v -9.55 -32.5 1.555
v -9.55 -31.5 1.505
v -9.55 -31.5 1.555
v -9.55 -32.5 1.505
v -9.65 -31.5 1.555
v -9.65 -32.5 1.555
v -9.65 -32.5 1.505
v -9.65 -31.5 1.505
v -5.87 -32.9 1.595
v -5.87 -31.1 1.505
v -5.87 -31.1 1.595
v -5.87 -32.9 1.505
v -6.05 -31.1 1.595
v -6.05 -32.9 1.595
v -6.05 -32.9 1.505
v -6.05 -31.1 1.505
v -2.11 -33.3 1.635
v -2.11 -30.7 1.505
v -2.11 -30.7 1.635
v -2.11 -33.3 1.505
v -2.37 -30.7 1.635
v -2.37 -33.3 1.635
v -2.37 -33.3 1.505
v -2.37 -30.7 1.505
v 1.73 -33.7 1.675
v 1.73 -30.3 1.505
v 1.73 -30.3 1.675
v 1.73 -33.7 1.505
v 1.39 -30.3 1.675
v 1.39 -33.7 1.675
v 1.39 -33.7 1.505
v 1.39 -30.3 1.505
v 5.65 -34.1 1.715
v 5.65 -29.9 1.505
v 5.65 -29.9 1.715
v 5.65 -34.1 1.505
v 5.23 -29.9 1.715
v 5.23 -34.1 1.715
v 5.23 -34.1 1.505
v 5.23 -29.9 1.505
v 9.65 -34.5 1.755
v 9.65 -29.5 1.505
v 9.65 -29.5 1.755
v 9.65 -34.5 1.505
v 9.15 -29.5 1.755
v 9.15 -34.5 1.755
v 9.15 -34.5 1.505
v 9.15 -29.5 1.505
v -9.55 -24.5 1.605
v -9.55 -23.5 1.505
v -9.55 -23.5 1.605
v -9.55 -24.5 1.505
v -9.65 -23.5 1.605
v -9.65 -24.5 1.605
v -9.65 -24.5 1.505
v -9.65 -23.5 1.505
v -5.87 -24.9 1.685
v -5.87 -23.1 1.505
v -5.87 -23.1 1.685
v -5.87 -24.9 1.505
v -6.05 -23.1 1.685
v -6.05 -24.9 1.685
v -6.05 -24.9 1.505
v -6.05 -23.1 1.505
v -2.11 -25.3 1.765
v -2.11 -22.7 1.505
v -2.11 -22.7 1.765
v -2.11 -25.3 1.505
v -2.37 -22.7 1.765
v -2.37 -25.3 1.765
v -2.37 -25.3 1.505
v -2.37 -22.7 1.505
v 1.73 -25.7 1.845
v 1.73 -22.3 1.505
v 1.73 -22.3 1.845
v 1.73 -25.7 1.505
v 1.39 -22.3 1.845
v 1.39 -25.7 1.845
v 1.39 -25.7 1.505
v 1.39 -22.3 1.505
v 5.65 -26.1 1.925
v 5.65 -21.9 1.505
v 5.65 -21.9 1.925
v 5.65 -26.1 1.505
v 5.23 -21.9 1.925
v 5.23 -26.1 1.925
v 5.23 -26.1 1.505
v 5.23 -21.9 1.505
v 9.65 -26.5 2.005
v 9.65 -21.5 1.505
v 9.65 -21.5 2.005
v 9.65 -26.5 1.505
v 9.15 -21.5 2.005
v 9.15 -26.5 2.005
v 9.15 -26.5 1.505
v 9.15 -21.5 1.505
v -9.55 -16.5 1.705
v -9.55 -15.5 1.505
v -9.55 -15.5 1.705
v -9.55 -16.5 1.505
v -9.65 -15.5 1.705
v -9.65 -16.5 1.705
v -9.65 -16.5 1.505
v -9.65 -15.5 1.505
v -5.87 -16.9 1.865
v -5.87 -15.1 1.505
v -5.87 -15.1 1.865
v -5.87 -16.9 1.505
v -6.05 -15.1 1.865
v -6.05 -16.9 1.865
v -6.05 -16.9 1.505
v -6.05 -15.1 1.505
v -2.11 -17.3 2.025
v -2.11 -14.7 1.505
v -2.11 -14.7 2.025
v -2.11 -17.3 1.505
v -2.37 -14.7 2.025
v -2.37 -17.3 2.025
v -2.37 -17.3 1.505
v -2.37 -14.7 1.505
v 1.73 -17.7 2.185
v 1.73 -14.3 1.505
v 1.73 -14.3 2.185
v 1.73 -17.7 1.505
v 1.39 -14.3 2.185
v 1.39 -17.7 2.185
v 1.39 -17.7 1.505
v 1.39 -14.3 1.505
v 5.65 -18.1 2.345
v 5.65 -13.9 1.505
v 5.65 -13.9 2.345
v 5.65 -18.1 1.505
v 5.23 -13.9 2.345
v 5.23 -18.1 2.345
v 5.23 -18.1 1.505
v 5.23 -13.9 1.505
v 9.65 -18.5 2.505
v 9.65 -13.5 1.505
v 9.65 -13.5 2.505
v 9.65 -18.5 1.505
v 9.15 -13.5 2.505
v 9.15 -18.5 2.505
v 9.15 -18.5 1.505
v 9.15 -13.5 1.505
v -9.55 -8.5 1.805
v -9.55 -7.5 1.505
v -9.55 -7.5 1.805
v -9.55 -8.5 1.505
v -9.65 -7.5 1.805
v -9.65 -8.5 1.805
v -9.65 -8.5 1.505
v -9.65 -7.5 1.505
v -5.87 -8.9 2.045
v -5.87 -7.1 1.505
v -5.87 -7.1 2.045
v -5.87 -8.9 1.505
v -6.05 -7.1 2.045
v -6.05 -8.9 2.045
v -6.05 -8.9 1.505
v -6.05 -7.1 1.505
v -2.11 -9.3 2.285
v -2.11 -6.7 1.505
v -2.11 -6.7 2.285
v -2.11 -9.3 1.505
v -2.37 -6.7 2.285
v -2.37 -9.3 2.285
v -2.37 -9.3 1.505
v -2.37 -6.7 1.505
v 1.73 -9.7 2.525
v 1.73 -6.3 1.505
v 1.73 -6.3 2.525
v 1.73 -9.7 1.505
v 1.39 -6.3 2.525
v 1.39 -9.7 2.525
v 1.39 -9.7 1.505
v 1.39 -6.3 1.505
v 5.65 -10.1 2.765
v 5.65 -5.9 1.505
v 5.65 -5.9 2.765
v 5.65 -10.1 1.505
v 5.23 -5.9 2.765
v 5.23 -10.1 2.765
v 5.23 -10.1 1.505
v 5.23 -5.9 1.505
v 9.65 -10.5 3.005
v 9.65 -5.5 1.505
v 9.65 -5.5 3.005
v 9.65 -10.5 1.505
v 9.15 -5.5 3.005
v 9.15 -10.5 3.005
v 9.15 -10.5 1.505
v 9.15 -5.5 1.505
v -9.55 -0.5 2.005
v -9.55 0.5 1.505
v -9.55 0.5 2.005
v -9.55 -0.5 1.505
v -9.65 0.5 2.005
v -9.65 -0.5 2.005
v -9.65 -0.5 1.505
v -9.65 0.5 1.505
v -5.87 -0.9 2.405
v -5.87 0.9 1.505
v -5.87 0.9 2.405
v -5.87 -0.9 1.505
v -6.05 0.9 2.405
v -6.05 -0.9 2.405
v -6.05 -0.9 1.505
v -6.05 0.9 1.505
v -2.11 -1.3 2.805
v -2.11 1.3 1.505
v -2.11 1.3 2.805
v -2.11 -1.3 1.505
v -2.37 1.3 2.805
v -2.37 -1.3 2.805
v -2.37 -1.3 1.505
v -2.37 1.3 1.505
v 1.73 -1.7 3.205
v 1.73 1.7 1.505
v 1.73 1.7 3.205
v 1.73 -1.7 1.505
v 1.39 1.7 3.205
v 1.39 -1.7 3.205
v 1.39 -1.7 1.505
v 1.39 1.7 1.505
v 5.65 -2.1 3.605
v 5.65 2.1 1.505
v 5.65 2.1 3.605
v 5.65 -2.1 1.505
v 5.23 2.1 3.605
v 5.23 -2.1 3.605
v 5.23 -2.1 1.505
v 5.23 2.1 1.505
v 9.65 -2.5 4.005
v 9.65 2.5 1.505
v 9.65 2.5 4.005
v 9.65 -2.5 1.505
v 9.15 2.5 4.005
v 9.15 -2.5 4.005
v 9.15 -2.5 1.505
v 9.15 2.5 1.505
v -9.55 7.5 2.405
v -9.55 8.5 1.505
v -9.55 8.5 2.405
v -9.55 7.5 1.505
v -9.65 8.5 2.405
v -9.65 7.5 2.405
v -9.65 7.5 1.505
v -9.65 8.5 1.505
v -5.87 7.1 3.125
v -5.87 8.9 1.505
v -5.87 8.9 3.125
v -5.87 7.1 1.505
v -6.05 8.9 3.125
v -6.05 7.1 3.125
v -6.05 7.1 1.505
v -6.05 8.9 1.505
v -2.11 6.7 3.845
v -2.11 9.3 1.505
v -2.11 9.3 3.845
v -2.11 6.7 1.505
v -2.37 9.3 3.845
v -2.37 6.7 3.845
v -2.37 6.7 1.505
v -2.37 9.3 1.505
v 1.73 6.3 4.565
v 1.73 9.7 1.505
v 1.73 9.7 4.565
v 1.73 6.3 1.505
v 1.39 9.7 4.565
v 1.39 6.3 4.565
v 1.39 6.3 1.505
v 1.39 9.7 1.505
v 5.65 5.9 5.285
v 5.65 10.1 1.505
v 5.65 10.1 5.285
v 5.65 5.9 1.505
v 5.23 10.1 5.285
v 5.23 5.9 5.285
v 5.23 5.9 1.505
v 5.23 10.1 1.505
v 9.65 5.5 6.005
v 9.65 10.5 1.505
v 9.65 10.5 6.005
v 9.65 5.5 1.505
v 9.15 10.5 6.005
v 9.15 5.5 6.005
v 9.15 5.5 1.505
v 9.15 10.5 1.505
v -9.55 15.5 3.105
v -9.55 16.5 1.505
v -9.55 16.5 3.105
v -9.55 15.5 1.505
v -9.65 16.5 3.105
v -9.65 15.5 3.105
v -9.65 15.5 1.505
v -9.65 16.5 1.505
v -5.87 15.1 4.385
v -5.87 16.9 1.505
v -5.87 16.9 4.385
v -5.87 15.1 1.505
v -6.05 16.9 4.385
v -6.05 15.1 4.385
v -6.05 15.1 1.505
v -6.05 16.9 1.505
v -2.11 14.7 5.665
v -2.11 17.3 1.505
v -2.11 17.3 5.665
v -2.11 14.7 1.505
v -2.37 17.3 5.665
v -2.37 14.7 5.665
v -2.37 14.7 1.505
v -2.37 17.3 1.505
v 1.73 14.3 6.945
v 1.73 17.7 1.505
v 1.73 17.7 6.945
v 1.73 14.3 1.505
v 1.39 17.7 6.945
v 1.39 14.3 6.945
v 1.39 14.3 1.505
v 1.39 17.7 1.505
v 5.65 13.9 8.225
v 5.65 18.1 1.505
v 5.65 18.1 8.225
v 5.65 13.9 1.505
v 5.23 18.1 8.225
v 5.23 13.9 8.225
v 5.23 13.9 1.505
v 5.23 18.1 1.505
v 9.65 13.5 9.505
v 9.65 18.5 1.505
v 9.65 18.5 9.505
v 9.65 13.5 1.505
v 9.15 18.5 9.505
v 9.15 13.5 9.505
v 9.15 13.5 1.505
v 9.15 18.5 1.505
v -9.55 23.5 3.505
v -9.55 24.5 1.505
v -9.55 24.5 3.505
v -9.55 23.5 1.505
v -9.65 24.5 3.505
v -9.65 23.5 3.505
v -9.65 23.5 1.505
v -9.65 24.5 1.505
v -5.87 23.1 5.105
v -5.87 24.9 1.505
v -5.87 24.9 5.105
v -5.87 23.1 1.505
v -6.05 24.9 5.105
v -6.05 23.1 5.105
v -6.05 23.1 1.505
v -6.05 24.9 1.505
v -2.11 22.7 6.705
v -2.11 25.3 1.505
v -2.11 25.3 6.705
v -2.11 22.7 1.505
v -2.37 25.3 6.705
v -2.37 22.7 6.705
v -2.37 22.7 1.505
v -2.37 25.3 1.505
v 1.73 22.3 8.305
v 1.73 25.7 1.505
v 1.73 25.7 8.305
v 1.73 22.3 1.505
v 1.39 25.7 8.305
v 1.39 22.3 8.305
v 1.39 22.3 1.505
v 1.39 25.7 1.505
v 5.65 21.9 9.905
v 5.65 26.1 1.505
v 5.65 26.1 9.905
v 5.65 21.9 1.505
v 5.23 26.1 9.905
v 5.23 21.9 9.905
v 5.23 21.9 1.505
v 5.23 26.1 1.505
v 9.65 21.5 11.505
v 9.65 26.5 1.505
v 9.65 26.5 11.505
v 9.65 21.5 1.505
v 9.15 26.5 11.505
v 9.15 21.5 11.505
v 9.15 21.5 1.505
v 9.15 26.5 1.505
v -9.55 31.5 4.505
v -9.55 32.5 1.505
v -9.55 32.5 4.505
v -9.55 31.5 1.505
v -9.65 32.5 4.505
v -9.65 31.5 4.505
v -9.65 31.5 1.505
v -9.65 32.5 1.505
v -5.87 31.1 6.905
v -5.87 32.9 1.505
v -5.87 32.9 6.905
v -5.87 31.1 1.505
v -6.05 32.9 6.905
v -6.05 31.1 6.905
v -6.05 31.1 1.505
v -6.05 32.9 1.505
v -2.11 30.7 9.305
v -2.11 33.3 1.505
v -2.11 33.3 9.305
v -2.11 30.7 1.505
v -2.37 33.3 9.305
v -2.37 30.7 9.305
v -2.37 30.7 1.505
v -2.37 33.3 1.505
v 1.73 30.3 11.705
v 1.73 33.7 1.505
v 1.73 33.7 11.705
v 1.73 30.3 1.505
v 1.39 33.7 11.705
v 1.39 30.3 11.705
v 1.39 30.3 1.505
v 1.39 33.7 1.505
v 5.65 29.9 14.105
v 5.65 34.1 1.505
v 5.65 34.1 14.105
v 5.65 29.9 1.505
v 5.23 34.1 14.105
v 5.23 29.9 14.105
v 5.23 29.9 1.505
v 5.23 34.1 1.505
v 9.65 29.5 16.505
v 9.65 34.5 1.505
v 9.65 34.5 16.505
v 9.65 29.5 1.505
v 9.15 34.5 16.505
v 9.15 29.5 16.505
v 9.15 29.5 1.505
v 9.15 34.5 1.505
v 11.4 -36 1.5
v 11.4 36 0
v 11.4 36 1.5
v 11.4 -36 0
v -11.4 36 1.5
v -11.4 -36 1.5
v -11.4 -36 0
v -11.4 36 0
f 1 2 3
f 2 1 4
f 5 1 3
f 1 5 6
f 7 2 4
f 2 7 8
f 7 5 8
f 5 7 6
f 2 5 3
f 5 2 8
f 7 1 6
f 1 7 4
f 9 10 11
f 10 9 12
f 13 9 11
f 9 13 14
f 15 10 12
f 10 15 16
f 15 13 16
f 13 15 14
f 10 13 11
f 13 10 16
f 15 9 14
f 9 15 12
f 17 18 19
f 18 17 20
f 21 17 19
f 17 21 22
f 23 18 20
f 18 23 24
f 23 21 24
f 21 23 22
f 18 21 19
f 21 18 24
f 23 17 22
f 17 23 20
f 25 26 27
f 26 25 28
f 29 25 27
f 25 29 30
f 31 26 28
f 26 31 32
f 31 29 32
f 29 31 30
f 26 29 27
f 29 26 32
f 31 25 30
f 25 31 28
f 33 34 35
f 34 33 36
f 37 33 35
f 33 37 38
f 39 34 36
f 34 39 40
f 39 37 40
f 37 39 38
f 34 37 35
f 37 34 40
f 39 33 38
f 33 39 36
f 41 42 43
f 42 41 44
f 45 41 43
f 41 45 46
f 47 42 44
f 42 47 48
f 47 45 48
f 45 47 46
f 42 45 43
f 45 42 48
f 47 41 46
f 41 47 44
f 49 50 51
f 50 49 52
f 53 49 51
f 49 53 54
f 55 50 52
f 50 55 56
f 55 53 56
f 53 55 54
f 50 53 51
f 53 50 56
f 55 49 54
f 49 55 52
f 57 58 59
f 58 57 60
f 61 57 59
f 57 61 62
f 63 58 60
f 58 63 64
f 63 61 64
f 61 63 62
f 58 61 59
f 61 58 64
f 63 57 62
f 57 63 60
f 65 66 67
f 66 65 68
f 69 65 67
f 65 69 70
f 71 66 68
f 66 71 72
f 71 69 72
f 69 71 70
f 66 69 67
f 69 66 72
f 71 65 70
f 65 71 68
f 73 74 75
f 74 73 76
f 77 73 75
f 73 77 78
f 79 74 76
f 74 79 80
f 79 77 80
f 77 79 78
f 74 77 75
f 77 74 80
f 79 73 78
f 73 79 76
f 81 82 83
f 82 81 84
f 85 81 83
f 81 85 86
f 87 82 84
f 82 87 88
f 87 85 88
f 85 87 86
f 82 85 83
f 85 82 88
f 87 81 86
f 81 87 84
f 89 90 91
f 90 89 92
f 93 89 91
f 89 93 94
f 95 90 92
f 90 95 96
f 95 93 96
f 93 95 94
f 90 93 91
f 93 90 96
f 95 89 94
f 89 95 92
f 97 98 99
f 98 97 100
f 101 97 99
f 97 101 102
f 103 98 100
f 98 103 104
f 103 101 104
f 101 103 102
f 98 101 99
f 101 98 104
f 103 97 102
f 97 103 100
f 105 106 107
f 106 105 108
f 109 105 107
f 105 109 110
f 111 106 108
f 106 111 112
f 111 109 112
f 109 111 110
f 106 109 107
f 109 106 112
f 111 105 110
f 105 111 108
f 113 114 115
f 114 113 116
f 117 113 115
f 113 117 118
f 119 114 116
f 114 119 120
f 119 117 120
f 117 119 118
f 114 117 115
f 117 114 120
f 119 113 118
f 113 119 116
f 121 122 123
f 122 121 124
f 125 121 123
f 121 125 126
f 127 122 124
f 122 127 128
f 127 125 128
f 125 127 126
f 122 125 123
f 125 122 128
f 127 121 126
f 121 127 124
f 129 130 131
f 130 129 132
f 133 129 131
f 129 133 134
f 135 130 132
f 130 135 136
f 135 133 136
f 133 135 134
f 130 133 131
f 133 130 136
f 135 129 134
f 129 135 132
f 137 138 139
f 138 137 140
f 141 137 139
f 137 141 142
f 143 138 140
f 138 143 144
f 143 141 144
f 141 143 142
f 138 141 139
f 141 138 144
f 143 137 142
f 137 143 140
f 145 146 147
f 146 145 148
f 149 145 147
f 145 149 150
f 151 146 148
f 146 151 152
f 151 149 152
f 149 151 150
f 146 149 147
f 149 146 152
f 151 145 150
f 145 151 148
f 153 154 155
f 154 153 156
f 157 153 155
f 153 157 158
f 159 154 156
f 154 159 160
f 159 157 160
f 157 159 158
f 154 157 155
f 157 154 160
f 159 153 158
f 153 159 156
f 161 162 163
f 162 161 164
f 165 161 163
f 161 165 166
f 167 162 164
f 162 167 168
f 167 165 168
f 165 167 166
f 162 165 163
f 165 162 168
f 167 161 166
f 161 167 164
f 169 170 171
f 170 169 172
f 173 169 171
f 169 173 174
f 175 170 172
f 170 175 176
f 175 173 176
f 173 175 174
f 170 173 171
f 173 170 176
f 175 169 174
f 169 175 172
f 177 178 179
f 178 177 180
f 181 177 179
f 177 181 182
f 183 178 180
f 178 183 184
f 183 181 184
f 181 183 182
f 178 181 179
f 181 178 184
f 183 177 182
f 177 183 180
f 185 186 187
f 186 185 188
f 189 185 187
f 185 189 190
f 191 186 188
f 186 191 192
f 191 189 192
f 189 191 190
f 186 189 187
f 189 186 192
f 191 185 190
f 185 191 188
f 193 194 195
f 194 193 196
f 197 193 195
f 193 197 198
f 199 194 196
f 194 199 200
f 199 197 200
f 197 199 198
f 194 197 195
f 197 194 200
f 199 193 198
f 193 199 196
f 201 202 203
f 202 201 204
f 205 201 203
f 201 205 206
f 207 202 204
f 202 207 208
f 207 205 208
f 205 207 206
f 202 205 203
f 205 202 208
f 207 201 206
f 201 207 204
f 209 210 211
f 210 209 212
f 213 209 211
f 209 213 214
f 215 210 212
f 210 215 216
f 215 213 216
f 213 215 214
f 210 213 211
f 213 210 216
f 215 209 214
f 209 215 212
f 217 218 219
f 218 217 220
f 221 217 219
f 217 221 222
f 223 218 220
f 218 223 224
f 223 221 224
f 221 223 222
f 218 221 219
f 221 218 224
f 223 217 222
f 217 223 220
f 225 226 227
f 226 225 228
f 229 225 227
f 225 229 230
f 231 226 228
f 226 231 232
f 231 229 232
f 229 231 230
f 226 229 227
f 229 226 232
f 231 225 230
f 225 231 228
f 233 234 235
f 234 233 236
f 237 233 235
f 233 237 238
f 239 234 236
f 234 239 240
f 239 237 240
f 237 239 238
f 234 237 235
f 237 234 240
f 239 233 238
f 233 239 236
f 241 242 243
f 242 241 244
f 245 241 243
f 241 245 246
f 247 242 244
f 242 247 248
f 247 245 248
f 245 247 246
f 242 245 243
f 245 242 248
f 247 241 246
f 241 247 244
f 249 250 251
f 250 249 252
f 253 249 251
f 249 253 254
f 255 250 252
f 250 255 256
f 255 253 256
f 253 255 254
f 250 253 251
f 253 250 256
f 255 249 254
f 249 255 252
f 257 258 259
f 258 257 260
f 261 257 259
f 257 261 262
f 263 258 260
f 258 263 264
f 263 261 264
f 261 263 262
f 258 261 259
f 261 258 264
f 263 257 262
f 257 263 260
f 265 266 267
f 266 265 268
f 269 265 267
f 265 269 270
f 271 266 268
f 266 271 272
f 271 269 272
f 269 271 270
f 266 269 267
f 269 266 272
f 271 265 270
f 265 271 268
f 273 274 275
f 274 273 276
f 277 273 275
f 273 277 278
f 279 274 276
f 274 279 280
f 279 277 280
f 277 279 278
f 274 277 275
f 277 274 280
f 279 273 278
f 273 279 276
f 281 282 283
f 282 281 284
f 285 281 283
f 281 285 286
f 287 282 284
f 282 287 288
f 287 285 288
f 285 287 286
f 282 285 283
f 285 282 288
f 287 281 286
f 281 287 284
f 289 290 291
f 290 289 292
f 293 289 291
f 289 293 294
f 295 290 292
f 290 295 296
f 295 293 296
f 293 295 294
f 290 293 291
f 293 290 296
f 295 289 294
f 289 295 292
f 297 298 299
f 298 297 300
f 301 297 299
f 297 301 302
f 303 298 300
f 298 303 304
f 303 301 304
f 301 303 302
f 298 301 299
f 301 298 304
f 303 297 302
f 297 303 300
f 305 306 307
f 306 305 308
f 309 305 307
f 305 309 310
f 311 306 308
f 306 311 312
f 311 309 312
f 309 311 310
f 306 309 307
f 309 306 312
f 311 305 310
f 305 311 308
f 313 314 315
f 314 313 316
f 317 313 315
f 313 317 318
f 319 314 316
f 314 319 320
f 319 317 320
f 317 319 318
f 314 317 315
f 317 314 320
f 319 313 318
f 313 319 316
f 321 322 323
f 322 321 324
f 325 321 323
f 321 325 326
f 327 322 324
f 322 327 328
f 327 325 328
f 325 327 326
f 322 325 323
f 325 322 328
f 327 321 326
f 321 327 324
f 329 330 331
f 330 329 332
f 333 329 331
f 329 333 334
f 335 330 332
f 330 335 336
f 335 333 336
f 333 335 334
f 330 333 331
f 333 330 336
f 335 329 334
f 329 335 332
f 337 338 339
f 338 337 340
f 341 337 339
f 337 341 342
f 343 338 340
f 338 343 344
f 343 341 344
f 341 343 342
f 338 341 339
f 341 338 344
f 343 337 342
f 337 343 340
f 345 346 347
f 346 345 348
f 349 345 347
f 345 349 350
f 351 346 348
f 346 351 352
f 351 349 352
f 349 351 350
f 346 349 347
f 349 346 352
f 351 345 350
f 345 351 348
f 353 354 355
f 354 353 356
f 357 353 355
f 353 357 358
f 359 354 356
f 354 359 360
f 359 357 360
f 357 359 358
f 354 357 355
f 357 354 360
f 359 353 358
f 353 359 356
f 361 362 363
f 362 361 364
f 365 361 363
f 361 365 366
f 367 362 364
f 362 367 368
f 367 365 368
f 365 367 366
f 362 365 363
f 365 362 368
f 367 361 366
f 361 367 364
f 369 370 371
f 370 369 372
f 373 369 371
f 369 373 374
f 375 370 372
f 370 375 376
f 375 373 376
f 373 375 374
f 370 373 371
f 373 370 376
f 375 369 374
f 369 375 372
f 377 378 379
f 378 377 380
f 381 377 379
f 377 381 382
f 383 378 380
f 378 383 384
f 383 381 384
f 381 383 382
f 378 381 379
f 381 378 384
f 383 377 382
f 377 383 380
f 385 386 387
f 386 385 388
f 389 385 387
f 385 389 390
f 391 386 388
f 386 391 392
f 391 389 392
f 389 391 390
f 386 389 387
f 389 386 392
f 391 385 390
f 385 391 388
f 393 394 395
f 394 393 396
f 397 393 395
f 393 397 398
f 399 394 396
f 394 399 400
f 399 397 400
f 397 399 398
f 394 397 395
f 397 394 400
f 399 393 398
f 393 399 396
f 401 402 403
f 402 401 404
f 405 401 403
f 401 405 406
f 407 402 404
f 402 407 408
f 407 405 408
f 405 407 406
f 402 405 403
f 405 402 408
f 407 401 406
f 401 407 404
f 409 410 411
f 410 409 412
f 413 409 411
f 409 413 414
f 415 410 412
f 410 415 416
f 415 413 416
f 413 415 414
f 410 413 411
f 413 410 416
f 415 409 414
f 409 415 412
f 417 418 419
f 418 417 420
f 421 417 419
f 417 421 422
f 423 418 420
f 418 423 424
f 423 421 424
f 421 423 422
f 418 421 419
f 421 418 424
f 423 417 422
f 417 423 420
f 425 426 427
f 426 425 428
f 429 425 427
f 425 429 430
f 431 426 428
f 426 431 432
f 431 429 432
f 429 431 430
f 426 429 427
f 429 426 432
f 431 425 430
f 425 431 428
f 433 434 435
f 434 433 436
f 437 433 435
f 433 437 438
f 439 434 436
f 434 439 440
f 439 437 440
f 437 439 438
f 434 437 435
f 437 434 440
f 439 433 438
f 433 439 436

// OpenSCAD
// file: ../include/vector_math.scad
// vector_math.scad - a scad file containing resource functions for working with vectors.
// Ben Weiss, University of Washington 2016


// returns a list of zeros of a specified length
function zeros(size) = size > 0 ? [ for (i = [0:size-1]) 0 ] : [];
function ones(size) = size > 0 ? [ for (i = [0:size-1]) 1 ] : [];

// flattens a list
// output : list with the outer level nesting removed
function flatten(l) = [ for (a = l) for (b = a) b ] ;

// interleaves two vectors and returns the result. The vectors must be the same length.
function interleave(first, second) = flatten([ for (i = [0 : 1 : len(first) - 1]) [first[i], second[i]] ]);

// returns the map [a[b[0]], a[b[1]], ..., a[b[n]]]
function veclookup(a, b) = [ for (i = [0 : 1 : len(b) - 1]) a[b[i]] ];

// generate a list of ordinal numbers (0, 1, 2...), as you would normally get using
// [start:step:end].
function series(start, step, end) = [ for (i = [start : step : end]) i ];
	
// Reverses the order in a list
function reverse(list) = [ for (i = [0:len(list)-1]) list[len(list) - 1 - i] ];

// recursion - find the sum of the values in a vector (array)
// from the start (or s'th element) to the i'th element - remember elements are zero based

function sumv(v,i,s=0) = (i==s ? v[i] : v[i] + sumv(v,i-1,s));
function sum(v) = sumv(v, len(v) - 1);
function sucsum(v) = [ for (i = [0 : len(v) - 1]) sumv(v, i)];

// Similar to the above, but recursively combines all elements into a single string, without commas.
function strconcatv(v, i, s=0) = (i==s ? str(v[i]) : str(str(v[i]), strconcatv(v,i-1,s)));
function strconcat(v) = strconcatv(v, len(v) - 1);
	
// Take the first or last few elements of a vector. Use negative n to read from the end.
function take(vec, n=1) = [ for (i = [0 : abs(n)-1]) n < 0 ? vec[len(vec) - i - 1] : vec[i] ];
	
// Pick a single element out of a list. This is like [k], except [-k] counts from the end. FUTURE: Support splicing by specifying k as a list.
function elem(vec, k) = k >= 0 ? vec[k] : vec[len(vec) + k];
// file: ../include/barcode.scad
// Barcode generator test
// This script generates an interleaved 2of5 barcode for marking parts
// Source data: https://en.wikipedia.org/wiki/Interleaved_2_of_5
//
// NOTE: functions barcode() and barcode_block() only work
// for codes up to about 15 digits before we reach double precision
// roundoff. For longer codes, use barcode_long() and specify the
// digits as an array.

use <vector_math.scad>;

testing = false;
if(testing)
{
	input = 1;


	translate([5, 10, 0])
	color([0.1, 0.1, 0.1])
	echo(barcode_length=barcode_length(4, 0.5));
	barcode(input, min_digits=4, line_width=0.5,center=true);
}

// barcode() works for codes up to 15 digits long. After that, my ability to discern
// digits is constrained by floating point arithematic. To get more digits, use 
// barcode_long and pass it an array of digits.
//
// Parameters:
//   code: number to encode into the barcode
//   min_digits: minimum number of digits (so code=1, min_digits=4 encodes "0004")
//   invert: make the geometry the spaces instead of the bars. This is sometimes useful
//      for example when doing a difference().
//   line_width=1: width of a thin line or gap in model units
//   bar_heigth=10: height of the barcode bars in model units
//   bar_depth=1: depth of the barcode object (thickness into the page)
//   thick_thin_ratio=2.5: ratio of the thick line to thin line thickness. Should be 2.2-3.0
//   center=false: draw the object at the origin centered (similar to cube()).
module barcode(code, min_digits=0, invert=false, line_width=1, bar_height=10, bar_depth = 1, thick_thin_ratio=2.5, center=false)
{
	raw = get_digits(code);
	input = concat(zeros(min_digits - len(raw)), raw);
	barcode_long(input, min_digits, invert, line_width, bar_height, bar_depth, thick_thin_ratio, center);
}
module barcode_long(input_digits, min_digits=0, invert=false, line_width=1, bar_height=10, bar_depth = 1, thick_thin_ratio=2.5, center=false)
{
	

	bar_widths = [line_width, line_width * thick_thin_ratio];		// widths of the bars.
	start_code = [0, 0, 0, 0];
	end_code = [1, 0, 0];
	digit_codes = [[0,0,1,1,0],
						[1,0,0,0,1],
						[0,1,0,0,1],
						[1,1,0,0,0],
						[0,0,1,0,1],
						[1,0,1,0,0],
						[0,1,1,0,0],
						[0,0,0,1,1],
						[1,0,0,1,0],
						[0,1,0,1,0]];
	// We can only encode an even number of digits
	digits = len(input_digits) % 2 == 0 ? input_digits : concat(0, input_digits);
	if(testing) echo(digits=digits);
	
	// do the interleaving so we have a single vector of widths for each step
	widths = veclookup(bar_widths, concat(start_code,
									flatten([ for (i = [0 : 2 : len(digits) - 1]) 
												interleave(digit_codes[digits[i]], digit_codes[digits[i+1]]) ]),
									end_code));
	centers = sucsum(concat(0,widths)) + widths * 0.5;
	if(testing) echo(widths=widths);
	if(testing) echo(centers=centers);

	// Now we just have to generate the solids
	translate(center ? [-barcode_length(len(digits), line_width, thick_thin_ratio) * 0.5, -bar_height * 0.5, -bar_depth * 0.5] : [0, 0, 0])
	for(i = [(invert ? 1 : 0):2:(len(widths) - 1)])
	{
		translate([centers[i], bar_height * 0.5, bar_depth * 0.5])
		cube(size=[widths[i], bar_height, bar_depth], center=true);
	}
}

// Creates a negative barcode in a block (convenience function)
module barcode_block(code, min_digits=0, invert=false, line_width=1, bar_height=10, bar_depth = 1, thick_thin_ratio=2.5, center=false, x_margin=8, y_margin=4)
{
	translate(center ? [0, 0, 0] : [0.5 * barcode_length(num_digits(code)) + x_margin, 0.5 * bar_height + y_margin, bar_depth * 0.5])
	difference()
	{
		cube(size=[barcode_length(max(min_digits, num_digits(code)), line_width) + x_margin * 2, bar_height + y_margin * 2, bar_depth],center=true);
		barcode(code, min_digits, invert, line_width, bar_height, bar_depth * 1.01, thick_thin_ratio, center=true);
	}
}

// Utility function: returns the width of the barcode, given the number of digits
function barcode_length(num_digits, line_width=1, thick_thin_ratio=2.5) = (4 + (2 + thick_thin_ratio) + (thick_thin_ratio * 2 + 3) * ceil(num_digits/2)*2) * line_width;

// returns the successive digits in a number.
function num_digits(num) = num == 0 ? 1 : ceil(log(num + 0.001));
function get_digits(num) = [ for (i = [num_digits(num):-1:1]) floor((num % pow(10, i)) / pow(10, i-1)) ];
	
// main file
/********************************************
 * Length/thickness Aspect Ratio Interpolation Test Model for fins
 *
 * Ben Weiss, University of Washington 2016
 *
 * This model is used to determine the minimum
 * thickness required to obtain printable and
 * acceptable results for vertical fins
 * features at various width/thickness aspect ratios.
 *
 * This model is part of a collection of models
 * for determining angle interpolation information
 * for a printer. 
 *
 * TODO: Parameterize this model so the base thickness
 * does not drop below PosFinThkH.
 *******************************************/

include <../include/features.scad>;
do_barcode=false;
do_text=false;

serialNo = 18;						// test number to encode in barcode

optionCount = 6;       // number of different thicknesses to produce

// Special variables set by front end.
layerHeight = 0.1;      // mm
nozzleDiameter = 0.1;   // mm

/*
<json>
	{
		"Imports": {
			"basic.yellow_final_PosFinThkV":"maxSizeMean",
			"basic.yellow_error_PosFinThkV":"maxSizeSpread",
			"basic.yellow_final_PosButtonDiaV":"minSizeMean",
			"basic.yellow_error_PosButtonDiaV":"minSizeSpread",
			
			"basic.yellow_final_PosPillarDiaH":"greenHFinThk",
			"basic.yellow_final_PosFinThkH":"greenHFinThk",
			"basic.yellow_final_PosFinThkV":"greenVFinThk",
			"basic.yellow_final_NegFinThkV":"greenVSlotThk"
		}
	}
</json>
*/

// Results from the main eval model needed here, to be overridden by the GUI.
maxSizeMean = 0.3;
maxSizeSpread = 0.2;
minSizeMean = 0.3;
minSizeSpread = 0.2;

greenHBarDia = 0.35;
greenHFinThk = 0.25;
greenVFinThk = 0.3;
greenVSlotThk = 1.5;


/*
This is an array variable declaration. It will be expanded into a set of variables
by the backend on load and re-condensed only for communicating with openscad.
The variables min[varBase], max[varBase], and skip[varBase] will be arrays.
<json>
    {
        "Name": ["2:1 Aspect Ratio",
								 "1:1 Aspect Ratio",
								 "2:1 Aspect Ratio",
								 "3:1 Aspect Ratio",
								 "5:1 Aspect Ratio",
								 "9:1 Aspect Ratio",
								 "16:1 Aspect Ratio",
								 "20:1 Aspect Ratio",
								 "30:1 Aspect Ratio"],
        "Desc": "Use the slider to indicate how many fins printed acceptably.",
        "LowKeyword": "Lost",
        "HighKeyword": "Printed",
        "varBase": "Dias",
        "minDefault": 0.075,
        "maxDefault": 0.175,
        "minDefaultND": "0.5 * nozzleDiameter",
        "maxDefaultND": "5 * nozzleDiameter",
        "cameraData": "9.57,-17.9,8.45,57.8,0,314.8,85",
        "sortOrder": 0,
				"instanceCount": 6
    }
</json>
*/

// These are roughly 2^[-1.6:0.4:3.6]
aspectRatios = [0.5, 1, 2, 3, 5, 9, 16, 20, 30]; 
ratioCount = len(aspectRatios);

// Range of thicknesses. These arrays will be overridden by the front end.

absMinDia = min(minSizeMean - minSizeSpread, maxSizeMean - maxSizeSpread) / 2;
ref_index = 5;		// index of aspectRatios that contains the maxSizeMean datapoint.
minDias = fspread(count=ratioCount, 
								low=minSizeMean - minSizeSpread,
								high=maxSizeMean - maxSizeSpread,
								highIdx=ref_index,
								minVal=absMinDia);
maxDias = fspread(count=ratioCount, 
								low=minSizeMean + minSizeSpread,
								high=maxSizeMean + maxSizeSpread,
								highIdx=ref_index,
								minVal=absMinDia * 2);
								
skipDias = ones(ratioCount) * -1;

echo(minDias=minDias);
echo(maxDias=maxDias);

// Derived variables
maxFinWidths = [ for (i = [0 : ratioCount - 1]) maxDias[i] * finWidthThkRatio ];
maxDia = max(maxDias);
minDia = min(minDias);
minGap = max([greenVSlotThk, greenHFinThk, greenVFinThk]) * 2;
meanDia = max([ for (i=[0:len(maxDias)-1]) (minDias[i] + maxDias[i]) * 0.5]);

coreWidth = optionCount * meanDia + (optionCount + 1) * minGap;
coreLen = sum(maxFinWidths) + (ratioCount) * minGap;
coreThk = greenHFinThk * 6;

fudge = greenHFinThk * 0.02;


color(normalColor)
union()
{
	core();
	
	echo(NEGATIVE=false);
	
	for(i = [0:ratioCount-1])
	{
		echo(str("SERIES=", i, "Dias"));
		locateY(i, coreLen, minGap, maxFinWidths)
		translate([0, 0, coreThk + fudge])
			fin_set(minDias[i], maxDias[i], aspectRatios[i], finWidthThkRatio, coreWidth, optionCount, skipDias[i], do_echo=true);
	}
}

module core()
{
	// build the core
	translate([0, 0, coreThk * 0.5])
	cube(size=[coreWidth, coreLen, coreThk], center=true);
	// add a barcode
	translate([coreWidth * 0.5 - fudge, 0, coreThk * 0.5])
	rotate([0, 0, 90])
		draw_barcode(serialNo, coreThk);

}
